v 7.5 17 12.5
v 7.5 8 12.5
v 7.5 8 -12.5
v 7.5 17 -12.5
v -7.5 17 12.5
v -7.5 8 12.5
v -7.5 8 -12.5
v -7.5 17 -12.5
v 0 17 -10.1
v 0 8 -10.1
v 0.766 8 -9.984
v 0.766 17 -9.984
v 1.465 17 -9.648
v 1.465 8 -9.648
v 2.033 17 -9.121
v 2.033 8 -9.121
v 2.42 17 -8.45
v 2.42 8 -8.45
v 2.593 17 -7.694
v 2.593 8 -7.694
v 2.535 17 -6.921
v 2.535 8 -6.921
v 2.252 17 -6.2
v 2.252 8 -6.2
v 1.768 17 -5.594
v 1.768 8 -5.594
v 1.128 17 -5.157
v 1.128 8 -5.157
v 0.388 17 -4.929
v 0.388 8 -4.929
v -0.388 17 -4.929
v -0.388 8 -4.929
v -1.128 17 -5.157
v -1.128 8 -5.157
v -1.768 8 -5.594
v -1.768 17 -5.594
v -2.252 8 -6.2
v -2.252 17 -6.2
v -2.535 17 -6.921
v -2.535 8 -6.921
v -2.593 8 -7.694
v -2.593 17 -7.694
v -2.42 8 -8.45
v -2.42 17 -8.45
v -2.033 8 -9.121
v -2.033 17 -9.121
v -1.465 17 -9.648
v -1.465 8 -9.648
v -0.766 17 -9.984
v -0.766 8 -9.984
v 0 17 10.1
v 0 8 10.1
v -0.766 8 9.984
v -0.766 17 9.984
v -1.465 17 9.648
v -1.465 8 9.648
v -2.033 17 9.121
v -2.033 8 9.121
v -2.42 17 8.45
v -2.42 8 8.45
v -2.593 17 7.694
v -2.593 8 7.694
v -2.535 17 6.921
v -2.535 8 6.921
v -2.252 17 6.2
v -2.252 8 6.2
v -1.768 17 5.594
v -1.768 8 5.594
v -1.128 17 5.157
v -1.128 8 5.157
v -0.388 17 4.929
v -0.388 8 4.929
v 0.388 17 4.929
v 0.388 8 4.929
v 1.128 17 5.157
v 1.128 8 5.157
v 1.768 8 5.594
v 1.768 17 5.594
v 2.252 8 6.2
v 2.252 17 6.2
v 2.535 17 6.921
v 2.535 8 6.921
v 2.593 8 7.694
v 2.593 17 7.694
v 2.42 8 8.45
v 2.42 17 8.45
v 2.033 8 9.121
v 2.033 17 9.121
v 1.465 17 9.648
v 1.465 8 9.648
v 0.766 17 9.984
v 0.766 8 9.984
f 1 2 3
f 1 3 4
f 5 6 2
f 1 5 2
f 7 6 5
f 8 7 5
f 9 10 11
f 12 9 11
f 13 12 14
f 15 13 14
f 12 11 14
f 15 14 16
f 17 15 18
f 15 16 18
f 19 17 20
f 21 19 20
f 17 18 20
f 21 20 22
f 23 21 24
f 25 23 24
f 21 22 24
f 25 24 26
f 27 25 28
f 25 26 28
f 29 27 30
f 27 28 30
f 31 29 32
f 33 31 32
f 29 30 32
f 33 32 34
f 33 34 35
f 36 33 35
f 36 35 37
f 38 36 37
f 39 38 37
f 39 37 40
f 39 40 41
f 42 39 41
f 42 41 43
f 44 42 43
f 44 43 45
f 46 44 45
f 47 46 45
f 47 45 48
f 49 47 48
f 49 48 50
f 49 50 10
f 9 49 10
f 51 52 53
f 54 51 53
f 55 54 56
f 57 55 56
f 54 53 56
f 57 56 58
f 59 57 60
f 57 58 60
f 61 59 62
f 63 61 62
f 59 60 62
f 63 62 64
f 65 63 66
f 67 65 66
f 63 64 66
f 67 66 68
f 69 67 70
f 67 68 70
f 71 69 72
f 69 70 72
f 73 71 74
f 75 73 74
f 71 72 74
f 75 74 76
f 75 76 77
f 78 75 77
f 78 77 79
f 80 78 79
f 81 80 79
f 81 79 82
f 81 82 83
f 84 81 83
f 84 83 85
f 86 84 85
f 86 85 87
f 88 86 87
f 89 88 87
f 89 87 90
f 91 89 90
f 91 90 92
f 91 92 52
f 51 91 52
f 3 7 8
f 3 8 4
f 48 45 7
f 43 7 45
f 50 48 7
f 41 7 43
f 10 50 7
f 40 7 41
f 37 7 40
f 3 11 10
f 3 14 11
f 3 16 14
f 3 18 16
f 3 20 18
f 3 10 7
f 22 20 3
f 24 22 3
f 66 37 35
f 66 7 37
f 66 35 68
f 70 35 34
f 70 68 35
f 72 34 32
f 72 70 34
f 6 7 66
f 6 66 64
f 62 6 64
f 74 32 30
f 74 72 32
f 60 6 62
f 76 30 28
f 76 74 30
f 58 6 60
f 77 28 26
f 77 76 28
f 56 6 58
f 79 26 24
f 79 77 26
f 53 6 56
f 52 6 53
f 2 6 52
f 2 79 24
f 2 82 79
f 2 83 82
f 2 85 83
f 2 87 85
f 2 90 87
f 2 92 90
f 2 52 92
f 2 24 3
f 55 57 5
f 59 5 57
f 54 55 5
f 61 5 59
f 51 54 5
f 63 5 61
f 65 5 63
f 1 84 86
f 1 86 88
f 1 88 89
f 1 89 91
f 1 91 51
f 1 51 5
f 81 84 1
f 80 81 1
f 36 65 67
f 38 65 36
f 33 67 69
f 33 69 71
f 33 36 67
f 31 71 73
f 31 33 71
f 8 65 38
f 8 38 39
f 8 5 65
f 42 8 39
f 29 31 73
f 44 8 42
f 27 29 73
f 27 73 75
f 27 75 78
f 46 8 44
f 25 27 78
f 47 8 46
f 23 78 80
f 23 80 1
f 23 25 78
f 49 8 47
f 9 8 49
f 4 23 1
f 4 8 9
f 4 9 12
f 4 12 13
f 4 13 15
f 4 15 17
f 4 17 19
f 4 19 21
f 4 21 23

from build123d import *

# Parameters (mm, degrees)
SKETCH_1_W          = 65
SKETCH_1_H          = 25
EXTRUDE_1_DEPTH     = 4
SKETCH_2_W          = 15
SKETCH_2_H          = 25
EXTRUDE_2_DEPTH     = 13
SKETCH_3_R          = 2.6
SKETCH_3_R_2        = 4
CUT_EXTRUDE_1_DEPTH = 39.74919354
SKETCH_5_W          = 15
SKETCH_5_H          = 4
EXTRUDE_3_DEPTH     = 6
SKETCH_6_R          = 1.25
CUT_EXTRUDE_3_DEPTH = 40.59166579
FILLET_2_R          = 3
CUT_EXTRUDE_4_DEPTH = 49.023431781
SKETCH_9_W          = 15
SKETCH_9_H          = 4
CUT_EXTRUDE_5_DEPTH = 42.403502267


with BuildPart() as part:
    # 草图1 → 凸台-拉伸1 (new body)
    with BuildSketch(Plane(origin=(0, 0, 0), x_dir=(1, 0, 0), z_dir=(0, 1, 0))):
        Rectangle(SKETCH_1_W, SKETCH_1_H)
    extrude(amount=EXTRUDE_1_DEPTH)

    # 草图2 → 凸台-拉伸2 (add)
    with BuildSketch(Plane(origin=(0, 4, 0), x_dir=(1, 0, 0), z_dir=(0, 1, 0))):
        Rectangle(SKETCH_2_W, SKETCH_2_H)
    extrude(amount=EXTRUDE_2_DEPTH)

    # 草图3 → 切除-拉伸1 (cut, through all)
    with BuildSketch(Plane.XZ):
        with Locations(Location((0, -7.5, 0), (0, 0, 270))):
            Circle(SKETCH_3_R)
        with Locations(Location((0, 7.5, 0), (0, 0, 90))):
            Circle(SKETCH_3_R)
        with Locations(Location((-22, 0, 0), (0, 0, 270))):
            Circle(SKETCH_3_R_2)
        with Locations(Location((22, 0, 0), (0, 0, 90))):
            Circle(SKETCH_3_R_2)
    extrude(amount=-CUT_EXTRUDE_1_DEPTH, mode=Mode.SUBTRACT)

    # 草图5 → 凸台-拉伸3 (add)
    with BuildSketch(Plane.XY.offset(12.5)):
        with Locations((0, 6)):
            Rectangle(SKETCH_5_W, SKETCH_5_H)
    extrude_3 = extrude(amount=EXTRUDE_3_DEPTH)

    # 草图6 → 切除-拉伸3 (cut, through all)
    with BuildSketch(Plane.XZ.offset(-4)):
        with Locations(Location((-4.5, 15.5, 0), (0, 0, 270))):
            Circle(SKETCH_6_R)
        with Locations(Location((4.5, 15.5, 0), (0, 0, 270))):
            Circle(SKETCH_6_R)
    cut_extrude_3 = extrude(amount=-CUT_EXTRUDE_3_DEPTH, mode=Mode.SUBTRACT)

    # 镜向2: 凸台-拉伸3, 切除-拉伸3 across plane
    add(extrude_3.mirror(Plane.XY))
    add(cut_extrude_3.mirror(Plane.XY), mode=Mode.SUBTRACT)

    # 圆角2
    fillet_2_edges = [part.edges().sort_by_distance(p)[0] for p in [
        (-7.5, 6, 18.5),
        (7.5, 6, 18.5),
        (-7.5, 6, -18.5),
        (7.5, 6, -18.5),
    ]]
    fillet(fillet_2_edges, radius=FILLET_2_R)

    # 草图7 → 切除-拉伸4 (cut, through all)
    with BuildSketch(Plane(origin=(0, 0, -12.5), x_dir=(-1, 0, 0), z_dir=(0, 0, -1))):
        Polygon((32.5, 4), (7.5, 4), (-7.5, 4), (-32.5, 4), (-32.5, 0), (32.5, 0), align=None)
    extrude(amount=-CUT_EXTRUDE_4_DEPTH, mode=Mode.SUBTRACT)

    # 草图9 → 切除-拉伸5 (cut, through all)
    with BuildSketch(Plane.XY.offset(18.5)):
        with Locations((0, 6)):
            Rectangle(SKETCH_9_W, SKETCH_9_H)
    extrude(amount=-CUT_EXTRUDE_5_DEPTH, mode=Mode.SUBTRACT)


solid = part.part
